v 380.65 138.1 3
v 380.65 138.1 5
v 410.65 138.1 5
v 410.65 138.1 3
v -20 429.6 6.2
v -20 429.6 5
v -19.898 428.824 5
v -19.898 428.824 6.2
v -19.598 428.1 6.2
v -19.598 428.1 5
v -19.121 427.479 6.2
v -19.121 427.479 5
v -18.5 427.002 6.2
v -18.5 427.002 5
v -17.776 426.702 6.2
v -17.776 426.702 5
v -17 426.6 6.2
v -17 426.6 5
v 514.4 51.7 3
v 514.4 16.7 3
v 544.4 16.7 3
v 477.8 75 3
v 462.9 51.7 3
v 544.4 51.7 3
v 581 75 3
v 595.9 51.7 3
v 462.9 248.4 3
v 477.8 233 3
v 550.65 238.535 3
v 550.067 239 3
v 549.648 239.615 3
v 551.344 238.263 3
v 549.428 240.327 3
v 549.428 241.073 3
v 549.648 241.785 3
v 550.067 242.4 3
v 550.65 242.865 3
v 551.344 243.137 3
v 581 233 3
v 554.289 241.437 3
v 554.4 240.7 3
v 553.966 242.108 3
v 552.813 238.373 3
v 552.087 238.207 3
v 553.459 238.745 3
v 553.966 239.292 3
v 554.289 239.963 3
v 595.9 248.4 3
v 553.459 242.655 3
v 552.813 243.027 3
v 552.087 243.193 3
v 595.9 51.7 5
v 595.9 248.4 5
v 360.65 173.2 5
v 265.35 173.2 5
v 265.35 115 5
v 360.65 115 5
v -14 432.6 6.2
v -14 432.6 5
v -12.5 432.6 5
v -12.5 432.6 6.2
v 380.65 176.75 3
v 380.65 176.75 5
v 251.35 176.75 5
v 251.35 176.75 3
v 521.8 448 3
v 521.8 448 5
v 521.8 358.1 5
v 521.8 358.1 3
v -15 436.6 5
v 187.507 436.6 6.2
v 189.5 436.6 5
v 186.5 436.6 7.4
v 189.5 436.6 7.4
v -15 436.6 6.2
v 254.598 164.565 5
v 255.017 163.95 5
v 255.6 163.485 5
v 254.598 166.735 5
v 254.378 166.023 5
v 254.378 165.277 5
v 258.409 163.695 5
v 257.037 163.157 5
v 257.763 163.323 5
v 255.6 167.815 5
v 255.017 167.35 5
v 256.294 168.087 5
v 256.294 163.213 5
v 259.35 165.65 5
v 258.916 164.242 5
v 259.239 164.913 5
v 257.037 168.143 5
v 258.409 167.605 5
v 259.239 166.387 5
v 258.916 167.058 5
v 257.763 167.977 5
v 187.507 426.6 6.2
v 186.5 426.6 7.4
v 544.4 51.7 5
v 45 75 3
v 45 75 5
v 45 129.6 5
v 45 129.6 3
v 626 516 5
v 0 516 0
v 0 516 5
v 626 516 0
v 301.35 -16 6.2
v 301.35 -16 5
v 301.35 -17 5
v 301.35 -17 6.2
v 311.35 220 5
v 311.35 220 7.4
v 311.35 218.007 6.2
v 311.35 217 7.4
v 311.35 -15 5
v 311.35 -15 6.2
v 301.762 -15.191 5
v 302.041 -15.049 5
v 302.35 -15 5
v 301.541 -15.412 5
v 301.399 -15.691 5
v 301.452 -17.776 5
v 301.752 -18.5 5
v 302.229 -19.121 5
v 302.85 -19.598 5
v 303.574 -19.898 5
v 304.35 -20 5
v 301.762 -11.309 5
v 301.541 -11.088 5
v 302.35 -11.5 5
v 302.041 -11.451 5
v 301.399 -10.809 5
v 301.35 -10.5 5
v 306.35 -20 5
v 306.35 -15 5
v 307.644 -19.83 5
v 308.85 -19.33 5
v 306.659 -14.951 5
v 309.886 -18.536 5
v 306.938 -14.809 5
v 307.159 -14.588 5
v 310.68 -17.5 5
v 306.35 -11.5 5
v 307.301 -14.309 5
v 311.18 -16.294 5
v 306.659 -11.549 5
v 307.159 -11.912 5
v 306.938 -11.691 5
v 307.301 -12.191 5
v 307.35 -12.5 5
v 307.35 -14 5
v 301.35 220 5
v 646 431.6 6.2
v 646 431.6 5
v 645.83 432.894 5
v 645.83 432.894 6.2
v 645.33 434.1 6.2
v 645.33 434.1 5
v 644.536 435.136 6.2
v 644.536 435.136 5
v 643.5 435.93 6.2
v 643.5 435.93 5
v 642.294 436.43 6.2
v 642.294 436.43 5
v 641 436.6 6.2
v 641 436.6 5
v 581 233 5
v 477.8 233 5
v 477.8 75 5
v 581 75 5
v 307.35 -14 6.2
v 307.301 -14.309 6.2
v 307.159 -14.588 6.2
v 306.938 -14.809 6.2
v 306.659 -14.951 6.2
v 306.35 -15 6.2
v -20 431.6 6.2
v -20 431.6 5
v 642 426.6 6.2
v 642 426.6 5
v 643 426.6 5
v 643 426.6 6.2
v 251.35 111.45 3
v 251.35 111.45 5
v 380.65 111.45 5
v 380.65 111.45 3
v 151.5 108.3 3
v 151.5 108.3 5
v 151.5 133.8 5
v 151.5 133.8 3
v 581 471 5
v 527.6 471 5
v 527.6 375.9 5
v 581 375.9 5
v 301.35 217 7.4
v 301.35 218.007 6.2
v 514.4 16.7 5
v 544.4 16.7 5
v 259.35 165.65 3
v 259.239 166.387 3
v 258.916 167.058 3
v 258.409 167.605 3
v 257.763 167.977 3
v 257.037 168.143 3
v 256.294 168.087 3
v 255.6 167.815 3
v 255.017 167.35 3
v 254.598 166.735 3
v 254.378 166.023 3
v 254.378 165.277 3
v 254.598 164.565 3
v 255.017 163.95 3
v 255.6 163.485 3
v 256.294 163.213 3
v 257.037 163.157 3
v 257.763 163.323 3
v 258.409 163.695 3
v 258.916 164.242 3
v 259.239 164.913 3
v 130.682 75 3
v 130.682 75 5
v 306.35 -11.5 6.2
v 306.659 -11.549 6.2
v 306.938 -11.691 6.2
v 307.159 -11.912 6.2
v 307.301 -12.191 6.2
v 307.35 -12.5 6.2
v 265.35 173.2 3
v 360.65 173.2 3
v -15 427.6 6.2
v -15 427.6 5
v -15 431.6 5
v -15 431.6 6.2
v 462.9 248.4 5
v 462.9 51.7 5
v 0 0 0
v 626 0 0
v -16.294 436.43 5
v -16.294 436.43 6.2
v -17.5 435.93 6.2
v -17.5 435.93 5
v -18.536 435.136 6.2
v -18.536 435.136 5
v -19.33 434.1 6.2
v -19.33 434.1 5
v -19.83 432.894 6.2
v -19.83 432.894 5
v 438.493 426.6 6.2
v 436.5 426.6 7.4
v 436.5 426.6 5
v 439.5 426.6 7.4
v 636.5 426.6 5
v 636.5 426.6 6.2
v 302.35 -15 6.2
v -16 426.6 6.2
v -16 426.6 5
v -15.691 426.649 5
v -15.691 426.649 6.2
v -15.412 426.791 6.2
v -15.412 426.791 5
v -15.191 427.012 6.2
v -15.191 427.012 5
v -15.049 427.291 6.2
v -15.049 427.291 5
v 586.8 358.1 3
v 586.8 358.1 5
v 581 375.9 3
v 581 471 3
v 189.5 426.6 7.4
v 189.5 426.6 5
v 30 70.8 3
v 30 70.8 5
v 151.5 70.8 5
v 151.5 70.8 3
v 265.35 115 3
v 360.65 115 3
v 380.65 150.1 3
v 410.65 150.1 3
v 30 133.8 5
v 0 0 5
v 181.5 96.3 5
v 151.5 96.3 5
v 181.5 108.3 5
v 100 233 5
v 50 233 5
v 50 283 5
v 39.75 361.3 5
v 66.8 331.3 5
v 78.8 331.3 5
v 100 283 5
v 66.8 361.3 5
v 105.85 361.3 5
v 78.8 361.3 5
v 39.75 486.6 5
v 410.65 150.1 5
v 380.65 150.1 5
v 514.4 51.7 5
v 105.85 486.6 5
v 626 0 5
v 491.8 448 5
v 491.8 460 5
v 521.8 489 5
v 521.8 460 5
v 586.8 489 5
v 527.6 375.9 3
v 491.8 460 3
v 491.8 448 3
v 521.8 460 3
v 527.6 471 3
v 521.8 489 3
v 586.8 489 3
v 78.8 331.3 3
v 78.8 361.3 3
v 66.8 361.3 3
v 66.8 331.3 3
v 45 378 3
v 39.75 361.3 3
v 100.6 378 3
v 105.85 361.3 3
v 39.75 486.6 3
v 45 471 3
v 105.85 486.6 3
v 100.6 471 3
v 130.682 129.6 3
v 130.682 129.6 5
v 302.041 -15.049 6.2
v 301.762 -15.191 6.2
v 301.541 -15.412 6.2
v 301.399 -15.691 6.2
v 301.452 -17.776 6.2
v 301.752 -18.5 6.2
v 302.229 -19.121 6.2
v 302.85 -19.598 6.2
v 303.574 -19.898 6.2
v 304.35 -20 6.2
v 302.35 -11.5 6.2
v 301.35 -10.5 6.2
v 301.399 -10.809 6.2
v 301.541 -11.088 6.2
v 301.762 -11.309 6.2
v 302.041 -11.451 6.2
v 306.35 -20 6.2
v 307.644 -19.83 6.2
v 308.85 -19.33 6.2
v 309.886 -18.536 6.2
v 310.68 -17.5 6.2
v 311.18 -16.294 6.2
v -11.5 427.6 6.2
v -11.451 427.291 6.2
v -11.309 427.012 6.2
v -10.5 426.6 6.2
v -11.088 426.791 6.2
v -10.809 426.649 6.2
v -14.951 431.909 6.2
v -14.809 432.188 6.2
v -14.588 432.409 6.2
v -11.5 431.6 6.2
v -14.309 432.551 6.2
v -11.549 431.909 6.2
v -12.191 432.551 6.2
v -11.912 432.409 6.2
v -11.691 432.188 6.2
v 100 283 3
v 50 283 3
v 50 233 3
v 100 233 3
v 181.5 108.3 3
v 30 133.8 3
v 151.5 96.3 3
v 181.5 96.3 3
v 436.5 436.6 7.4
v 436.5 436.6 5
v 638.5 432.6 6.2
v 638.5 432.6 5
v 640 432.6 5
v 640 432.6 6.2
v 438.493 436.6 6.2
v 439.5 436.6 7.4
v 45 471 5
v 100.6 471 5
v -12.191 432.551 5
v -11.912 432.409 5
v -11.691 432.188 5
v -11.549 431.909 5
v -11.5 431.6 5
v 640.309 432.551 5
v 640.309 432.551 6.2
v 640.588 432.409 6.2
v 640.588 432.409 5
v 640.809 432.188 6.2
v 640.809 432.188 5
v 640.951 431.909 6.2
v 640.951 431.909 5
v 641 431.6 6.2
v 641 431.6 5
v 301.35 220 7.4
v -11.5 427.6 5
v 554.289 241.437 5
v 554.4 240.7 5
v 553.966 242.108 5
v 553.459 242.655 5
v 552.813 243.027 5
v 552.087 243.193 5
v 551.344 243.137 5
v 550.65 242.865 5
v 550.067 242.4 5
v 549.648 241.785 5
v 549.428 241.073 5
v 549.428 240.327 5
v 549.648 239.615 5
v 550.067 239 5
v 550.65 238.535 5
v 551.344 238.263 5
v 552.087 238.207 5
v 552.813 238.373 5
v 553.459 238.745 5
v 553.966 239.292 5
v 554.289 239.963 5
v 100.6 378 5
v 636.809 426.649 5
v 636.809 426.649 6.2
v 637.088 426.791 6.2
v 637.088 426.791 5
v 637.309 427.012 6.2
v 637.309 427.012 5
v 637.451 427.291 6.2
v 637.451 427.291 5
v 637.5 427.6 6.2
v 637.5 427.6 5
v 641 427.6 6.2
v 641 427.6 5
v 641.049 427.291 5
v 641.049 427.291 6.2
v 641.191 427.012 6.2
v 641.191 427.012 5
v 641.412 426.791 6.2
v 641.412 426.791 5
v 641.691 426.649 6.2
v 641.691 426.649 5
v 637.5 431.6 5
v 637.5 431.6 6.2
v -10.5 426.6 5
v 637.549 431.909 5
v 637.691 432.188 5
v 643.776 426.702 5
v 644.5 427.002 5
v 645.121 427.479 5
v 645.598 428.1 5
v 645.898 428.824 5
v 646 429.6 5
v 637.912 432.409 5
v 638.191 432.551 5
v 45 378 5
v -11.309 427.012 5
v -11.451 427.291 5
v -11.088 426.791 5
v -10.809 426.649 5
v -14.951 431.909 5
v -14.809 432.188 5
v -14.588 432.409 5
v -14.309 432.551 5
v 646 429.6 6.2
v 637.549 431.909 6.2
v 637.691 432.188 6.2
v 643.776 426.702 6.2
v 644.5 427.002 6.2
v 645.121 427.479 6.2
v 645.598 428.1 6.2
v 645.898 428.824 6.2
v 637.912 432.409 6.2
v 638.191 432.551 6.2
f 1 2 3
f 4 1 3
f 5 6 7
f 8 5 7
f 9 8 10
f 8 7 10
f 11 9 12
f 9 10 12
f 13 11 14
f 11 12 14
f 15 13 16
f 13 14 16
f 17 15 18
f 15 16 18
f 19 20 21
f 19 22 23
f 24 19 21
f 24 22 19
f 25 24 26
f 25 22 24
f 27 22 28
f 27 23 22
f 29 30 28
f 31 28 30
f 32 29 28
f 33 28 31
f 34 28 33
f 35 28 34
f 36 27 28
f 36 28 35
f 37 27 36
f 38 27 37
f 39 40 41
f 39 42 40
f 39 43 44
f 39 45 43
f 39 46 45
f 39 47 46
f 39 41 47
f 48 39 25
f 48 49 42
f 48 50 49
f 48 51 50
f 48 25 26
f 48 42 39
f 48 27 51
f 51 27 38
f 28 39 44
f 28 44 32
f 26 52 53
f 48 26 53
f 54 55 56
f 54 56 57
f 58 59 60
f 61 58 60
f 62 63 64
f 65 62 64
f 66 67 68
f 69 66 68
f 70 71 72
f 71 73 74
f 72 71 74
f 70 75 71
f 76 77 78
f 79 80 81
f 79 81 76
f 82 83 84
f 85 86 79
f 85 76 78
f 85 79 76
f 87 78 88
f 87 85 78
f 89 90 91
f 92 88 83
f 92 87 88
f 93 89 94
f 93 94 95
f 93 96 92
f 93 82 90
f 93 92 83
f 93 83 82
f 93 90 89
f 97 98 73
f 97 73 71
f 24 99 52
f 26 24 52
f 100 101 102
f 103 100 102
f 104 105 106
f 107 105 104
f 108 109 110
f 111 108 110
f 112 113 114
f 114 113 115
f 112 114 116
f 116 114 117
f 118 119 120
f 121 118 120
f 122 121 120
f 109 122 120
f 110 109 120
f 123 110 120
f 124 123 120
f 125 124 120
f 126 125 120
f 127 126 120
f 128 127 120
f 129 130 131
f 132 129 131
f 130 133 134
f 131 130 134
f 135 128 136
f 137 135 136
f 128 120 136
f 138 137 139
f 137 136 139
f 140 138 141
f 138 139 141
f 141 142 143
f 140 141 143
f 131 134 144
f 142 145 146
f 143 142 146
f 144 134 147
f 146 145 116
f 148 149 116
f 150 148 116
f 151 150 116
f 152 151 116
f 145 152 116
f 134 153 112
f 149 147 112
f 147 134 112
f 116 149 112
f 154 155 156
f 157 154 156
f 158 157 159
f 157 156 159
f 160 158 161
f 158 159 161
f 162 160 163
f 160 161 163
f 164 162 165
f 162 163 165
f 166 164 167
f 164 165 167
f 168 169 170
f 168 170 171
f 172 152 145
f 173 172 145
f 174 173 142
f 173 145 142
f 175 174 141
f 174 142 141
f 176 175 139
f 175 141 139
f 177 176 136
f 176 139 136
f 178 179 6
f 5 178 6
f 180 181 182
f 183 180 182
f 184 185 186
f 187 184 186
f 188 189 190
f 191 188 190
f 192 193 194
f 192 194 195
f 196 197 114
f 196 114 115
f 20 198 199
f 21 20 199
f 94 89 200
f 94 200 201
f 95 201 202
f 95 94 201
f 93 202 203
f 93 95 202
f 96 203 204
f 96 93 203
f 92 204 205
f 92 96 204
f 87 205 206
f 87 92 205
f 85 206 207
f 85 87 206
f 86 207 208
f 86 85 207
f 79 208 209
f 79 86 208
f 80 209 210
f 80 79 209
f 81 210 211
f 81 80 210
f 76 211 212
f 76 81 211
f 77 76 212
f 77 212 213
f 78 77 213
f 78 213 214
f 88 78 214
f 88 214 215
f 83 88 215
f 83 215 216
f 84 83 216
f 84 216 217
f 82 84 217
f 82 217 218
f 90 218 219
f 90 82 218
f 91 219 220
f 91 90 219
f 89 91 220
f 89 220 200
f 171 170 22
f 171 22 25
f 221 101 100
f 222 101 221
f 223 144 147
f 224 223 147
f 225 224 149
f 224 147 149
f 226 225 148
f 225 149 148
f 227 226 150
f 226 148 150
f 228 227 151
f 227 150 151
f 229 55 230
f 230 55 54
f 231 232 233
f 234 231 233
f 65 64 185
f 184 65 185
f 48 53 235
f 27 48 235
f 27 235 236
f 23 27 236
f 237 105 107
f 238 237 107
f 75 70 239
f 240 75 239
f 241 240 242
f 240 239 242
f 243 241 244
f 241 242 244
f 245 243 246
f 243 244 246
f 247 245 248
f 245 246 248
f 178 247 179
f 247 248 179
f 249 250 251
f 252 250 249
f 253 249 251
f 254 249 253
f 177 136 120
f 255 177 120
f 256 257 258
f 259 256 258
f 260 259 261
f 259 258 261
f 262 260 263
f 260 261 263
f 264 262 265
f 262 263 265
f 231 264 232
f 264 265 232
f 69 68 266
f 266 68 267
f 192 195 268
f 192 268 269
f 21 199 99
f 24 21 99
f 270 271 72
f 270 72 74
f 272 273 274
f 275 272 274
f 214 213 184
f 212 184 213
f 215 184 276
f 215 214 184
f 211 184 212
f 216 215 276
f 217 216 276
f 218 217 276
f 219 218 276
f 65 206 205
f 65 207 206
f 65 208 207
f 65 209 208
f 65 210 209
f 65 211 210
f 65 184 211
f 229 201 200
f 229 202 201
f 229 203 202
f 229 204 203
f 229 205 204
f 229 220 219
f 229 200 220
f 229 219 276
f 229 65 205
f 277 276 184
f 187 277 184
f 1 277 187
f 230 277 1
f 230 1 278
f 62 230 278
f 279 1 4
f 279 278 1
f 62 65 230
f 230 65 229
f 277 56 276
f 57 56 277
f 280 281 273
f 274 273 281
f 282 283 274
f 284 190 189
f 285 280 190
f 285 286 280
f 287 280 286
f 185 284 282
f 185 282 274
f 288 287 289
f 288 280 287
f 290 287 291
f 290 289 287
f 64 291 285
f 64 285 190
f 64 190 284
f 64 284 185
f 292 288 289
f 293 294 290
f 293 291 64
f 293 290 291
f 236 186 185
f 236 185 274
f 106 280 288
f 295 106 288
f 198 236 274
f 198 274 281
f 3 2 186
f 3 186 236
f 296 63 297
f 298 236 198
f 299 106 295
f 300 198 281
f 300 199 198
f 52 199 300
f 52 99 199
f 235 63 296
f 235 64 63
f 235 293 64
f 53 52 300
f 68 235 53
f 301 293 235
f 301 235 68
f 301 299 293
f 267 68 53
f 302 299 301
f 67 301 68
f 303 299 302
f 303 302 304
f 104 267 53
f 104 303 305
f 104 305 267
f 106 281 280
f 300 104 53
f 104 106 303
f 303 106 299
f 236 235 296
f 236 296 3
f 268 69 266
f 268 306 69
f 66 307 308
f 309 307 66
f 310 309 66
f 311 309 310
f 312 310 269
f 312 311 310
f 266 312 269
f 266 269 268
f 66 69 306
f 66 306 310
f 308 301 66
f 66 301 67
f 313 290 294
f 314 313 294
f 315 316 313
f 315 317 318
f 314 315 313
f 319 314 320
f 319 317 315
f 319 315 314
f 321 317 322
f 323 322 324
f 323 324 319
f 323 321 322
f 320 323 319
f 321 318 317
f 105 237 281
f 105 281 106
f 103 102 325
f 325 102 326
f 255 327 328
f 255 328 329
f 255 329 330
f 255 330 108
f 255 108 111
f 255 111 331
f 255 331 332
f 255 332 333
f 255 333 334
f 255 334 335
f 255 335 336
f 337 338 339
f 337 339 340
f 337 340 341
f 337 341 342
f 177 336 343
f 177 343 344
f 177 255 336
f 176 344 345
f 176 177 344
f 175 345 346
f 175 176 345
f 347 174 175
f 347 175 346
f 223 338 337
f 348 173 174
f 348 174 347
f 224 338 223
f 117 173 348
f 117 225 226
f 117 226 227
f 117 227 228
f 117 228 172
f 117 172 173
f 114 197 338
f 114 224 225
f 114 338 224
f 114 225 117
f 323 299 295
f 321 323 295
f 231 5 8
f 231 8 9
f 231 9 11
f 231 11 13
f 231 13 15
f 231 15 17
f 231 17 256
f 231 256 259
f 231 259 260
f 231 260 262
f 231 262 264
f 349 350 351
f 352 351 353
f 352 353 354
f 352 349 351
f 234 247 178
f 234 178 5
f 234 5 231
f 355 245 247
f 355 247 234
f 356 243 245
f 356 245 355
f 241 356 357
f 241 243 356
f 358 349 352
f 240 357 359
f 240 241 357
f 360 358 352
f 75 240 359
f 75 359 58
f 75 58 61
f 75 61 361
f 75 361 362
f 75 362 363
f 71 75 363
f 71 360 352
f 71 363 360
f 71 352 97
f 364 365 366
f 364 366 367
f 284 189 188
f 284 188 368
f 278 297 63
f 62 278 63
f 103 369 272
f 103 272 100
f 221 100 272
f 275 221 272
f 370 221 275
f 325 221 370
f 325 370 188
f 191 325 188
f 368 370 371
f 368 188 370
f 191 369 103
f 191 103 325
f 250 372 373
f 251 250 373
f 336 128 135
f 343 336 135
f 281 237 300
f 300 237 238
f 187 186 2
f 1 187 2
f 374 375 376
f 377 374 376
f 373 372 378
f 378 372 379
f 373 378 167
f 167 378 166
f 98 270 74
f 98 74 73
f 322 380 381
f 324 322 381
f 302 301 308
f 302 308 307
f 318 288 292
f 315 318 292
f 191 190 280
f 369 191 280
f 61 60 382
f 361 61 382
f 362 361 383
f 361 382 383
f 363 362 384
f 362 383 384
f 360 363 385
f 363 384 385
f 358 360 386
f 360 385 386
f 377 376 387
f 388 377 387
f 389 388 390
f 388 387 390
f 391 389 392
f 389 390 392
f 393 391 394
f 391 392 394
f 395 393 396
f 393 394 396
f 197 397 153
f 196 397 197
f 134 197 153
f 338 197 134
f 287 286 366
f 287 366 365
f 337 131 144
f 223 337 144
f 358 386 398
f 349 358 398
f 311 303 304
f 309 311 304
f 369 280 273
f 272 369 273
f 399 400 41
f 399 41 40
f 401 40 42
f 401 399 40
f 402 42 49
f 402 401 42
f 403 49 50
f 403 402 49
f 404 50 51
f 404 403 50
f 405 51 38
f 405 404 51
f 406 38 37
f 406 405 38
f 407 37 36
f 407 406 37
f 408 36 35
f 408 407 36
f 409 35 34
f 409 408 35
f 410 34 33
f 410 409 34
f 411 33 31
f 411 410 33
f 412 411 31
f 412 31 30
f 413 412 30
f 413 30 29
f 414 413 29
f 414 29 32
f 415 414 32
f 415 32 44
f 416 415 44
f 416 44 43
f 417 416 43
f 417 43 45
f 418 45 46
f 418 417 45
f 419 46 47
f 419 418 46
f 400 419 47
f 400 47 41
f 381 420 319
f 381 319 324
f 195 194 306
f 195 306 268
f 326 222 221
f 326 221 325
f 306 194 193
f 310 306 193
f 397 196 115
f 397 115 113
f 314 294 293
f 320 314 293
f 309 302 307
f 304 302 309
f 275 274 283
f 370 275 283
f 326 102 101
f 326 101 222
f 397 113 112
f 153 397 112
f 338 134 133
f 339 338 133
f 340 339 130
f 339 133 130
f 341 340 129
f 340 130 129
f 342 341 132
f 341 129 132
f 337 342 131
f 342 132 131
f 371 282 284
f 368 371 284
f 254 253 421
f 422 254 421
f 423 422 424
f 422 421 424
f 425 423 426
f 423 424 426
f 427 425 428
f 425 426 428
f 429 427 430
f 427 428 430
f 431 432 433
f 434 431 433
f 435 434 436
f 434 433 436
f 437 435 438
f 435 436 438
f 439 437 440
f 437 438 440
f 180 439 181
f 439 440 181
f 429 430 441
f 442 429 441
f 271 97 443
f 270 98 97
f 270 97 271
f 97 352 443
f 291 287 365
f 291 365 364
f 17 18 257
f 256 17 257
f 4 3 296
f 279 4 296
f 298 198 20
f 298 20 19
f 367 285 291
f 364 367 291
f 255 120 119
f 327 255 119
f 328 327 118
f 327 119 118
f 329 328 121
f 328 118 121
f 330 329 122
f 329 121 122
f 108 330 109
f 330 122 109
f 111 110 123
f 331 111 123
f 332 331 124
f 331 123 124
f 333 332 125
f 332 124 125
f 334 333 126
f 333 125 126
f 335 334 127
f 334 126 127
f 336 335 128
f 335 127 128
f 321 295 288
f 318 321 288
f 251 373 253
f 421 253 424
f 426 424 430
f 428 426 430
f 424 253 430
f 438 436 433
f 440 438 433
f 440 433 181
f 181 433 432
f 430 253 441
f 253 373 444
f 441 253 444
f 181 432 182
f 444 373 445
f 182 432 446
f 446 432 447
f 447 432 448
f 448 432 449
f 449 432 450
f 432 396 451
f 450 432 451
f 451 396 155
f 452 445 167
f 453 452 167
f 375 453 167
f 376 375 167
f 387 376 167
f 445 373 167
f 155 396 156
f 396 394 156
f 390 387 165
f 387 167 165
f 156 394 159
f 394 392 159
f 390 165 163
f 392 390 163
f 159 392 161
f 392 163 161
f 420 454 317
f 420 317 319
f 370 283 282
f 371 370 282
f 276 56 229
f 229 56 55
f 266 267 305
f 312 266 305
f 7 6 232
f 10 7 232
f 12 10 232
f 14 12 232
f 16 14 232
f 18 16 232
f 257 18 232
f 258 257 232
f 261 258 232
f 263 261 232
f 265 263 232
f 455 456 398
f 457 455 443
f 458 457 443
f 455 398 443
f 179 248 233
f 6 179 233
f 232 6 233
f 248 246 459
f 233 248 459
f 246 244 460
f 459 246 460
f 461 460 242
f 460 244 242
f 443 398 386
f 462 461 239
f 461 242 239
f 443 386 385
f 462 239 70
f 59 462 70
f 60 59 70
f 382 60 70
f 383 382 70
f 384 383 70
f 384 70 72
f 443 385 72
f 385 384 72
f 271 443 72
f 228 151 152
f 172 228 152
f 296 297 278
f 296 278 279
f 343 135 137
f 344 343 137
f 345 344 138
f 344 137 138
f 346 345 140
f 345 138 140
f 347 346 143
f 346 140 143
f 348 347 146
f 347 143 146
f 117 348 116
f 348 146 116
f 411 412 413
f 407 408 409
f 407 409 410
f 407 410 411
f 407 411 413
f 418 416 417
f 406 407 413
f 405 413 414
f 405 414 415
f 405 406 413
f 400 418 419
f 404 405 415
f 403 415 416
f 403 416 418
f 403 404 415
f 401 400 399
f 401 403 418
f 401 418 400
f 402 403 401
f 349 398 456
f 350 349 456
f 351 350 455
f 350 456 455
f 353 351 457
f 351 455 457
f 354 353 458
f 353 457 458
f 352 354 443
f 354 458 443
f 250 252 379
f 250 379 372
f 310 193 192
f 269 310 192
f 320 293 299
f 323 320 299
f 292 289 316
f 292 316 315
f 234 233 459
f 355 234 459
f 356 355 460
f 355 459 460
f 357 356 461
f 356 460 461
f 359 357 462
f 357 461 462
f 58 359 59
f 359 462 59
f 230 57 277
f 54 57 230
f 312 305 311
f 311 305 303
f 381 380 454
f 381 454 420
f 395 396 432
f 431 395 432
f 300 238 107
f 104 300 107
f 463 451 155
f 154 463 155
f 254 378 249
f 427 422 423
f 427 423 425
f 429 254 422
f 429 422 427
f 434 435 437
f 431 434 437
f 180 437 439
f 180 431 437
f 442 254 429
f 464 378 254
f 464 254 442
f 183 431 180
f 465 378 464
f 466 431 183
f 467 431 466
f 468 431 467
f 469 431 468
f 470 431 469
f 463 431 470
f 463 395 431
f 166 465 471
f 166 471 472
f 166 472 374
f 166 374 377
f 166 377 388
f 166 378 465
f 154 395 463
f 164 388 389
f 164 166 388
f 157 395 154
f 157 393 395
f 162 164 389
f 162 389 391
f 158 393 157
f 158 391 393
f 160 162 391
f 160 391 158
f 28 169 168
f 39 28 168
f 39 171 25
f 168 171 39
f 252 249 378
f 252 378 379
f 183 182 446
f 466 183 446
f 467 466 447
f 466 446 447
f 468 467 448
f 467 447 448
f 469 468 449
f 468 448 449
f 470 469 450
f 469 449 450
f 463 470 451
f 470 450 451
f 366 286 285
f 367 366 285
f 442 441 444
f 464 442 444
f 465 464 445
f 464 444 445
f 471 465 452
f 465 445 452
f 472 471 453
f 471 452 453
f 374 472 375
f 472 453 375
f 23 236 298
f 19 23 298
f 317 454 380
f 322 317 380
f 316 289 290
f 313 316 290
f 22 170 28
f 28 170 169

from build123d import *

# Parameters (mm, degrees)
F0_W      = 626
F0_H      = 516
F1_DEPTH  = 5
F3_W      = 95.3
F3_H      = 58.2
F3_R      = 2.5
F3_W_2    = 30
F3_H_2    = 12
F4_W      = 55.6
F4_H      = 93
F4_W_2    = 12
F4_H_2    = 30
F5_W      = 103.2
F5_H      = 158
F5_R      = 2.5
F5_W_2    = 30
F5_H_2    = 35
F2_W      = 53.4
F2_H      = 95.1
F2_W_2    = 30
F2_H_2    = 12
F6_W      = 85.68197
F6_H      = 54.6
F6_W_2    = 30
F6_H_2    = 12
F7_W      = 50
F7_H      = 50
F8_DEPTH  = 2
F10_DEPTH = 1.2
F12_DEPTH = 10
F14_DEPTH = 1.2
F16_DEPTH = 10
F18_DEPTH = 10


with BuildPart() as f1:
    # F0 (on Top) → F1 (new body)
    with BuildSketch(Plane.XY):
        with Locations((313, 258)):
            Rectangle(F0_W, F0_H)
    extrude(amount=F1_DEPTH)

    # F3 (on face) + F4 (on face) + F5 (on face) + F2 (on face) + F6 (on face) + F7 (on face) → F8 (cut)
    with BuildSketch(Plane.XY.offset(5)):
        Polygon((251.35, 111.45), (380.65, 111.45), (380.65, 138.1), (380.65, 150.1), (380.65, 176.75), (251.35, 176.75), align=None)
        with Locations((313, 144.1)):
            Rectangle(F3_W, F3_H, mode=Mode.SUBTRACT)
        with Locations((256.85, 165.65)):
            Circle(F3_R, mode=Mode.SUBTRACT)
        with Locations((395.65, 144.1)):
            Rectangle(F3_W_2, F3_H_2)
    with BuildSketch(Plane.XY.offset(5)):
        Polygon((78.8, 361.3), (105.85, 361.3), (105.85, 486.6), (39.75, 486.6), (39.75, 361.3), (66.8, 361.3), align=None)
        with Locations((72.8, 424.5)):
            Rectangle(F4_W, F4_H, mode=Mode.SUBTRACT)
        with Locations((72.8, 346.3)):
            Rectangle(F4_W_2, F4_H_2)
    with BuildSketch(Plane.XY.offset(5)):
        Polygon((544.4, 51.7), (595.9, 51.7), (595.9, 248.4), (462.9, 248.4), (462.9, 51.7), (514.4, 51.7), align=None)
        with Locations((529.4, 154)):
            Rectangle(F5_W, F5_H, mode=Mode.SUBTRACT)
        with Locations((551.9, 240.7)):
            Circle(F5_R, mode=Mode.SUBTRACT)
        with Locations((529.4, 34.2)):
            Rectangle(F5_W_2, F5_H_2)
    with BuildSketch(Plane.XY.offset(5)):
        Polygon((521.8, 358.1), (586.8, 358.1), (586.8, 489), (521.8, 489), (521.8, 460), (521.8, 448), align=None)
        with Locations((554.3, 423.45)):
            Rectangle(F2_W, F2_H, mode=Mode.SUBTRACT)
        with Locations((506.8, 454)):
            Rectangle(F2_W_2, F2_H_2)
    with BuildSketch(Plane.XY.offset(5)):
        Polygon((151.5, 108.3), (151.5, 133.8), (30, 133.8), (30, 70.8), (151.5, 70.8), (151.5, 96.3), align=None)
        with Locations((87.840985, 102.3)):
            Rectangle(F6_W, F6_H, mode=Mode.SUBTRACT)
        with Locations((166.5, 102.3)):
            Rectangle(F6_W_2, F6_H_2)
    with BuildSketch(Plane.XY.offset(5)):
        with Locations((75, 258)):
            Rectangle(F7_W, F7_H)
    extrude(amount=-F8_DEPTH, mode=Mode.SUBTRACT)


with BuildPart() as f10:
    # F9 (on face) → F10 (new body)
    with BuildSketch(Plane.XY.offset(5)):
        with BuildLine():
            Line((189.5, 436.6), (-15, 436.6))
            ThreePointArc((-15, 436.6), (-18.535534, 435.135534), (-20, 431.6))
            Line((-20, 431.6), (-20, 429.6))
            ThreePointArc((-20, 429.6), (-19.12132, 427.47868), (-17, 426.6))
            Line((-17, 426.6), (-16, 426.6))
            ThreePointArc((-16, 426.6), (-15.292893, 426.892893), (-15, 427.6))
            Line((-15, 427.6), (-15, 431.6))
            ThreePointArc((-15, 431.6), (-14.707107, 432.307107), (-14, 432.6))
            Line((-14, 432.6), (-12.5, 432.6))
            ThreePointArc((-12.5, 432.6), (-11.792893, 432.307107), (-11.5, 431.6))
            Line((-11.5, 431.6), (-11.5, 427.6))
            ThreePointArc((-11.5, 427.6), (-11.207107, 426.892893), (-10.5, 426.6))
            Line((-10.5, 426.6), (189.5, 426.6))
            Line((189.5, 426.6), (189.5, 436.6))
        make_face()
        with BuildLine():
            Line((642, 426.6), (643, 426.6))
            ThreePointArc((643, 426.6), (645.12132, 427.47868), (646, 429.6))
            Line((646, 429.6), (646, 431.6))
            ThreePointArc((646, 431.6), (644.535534, 435.135534), (641, 436.6))
            Line((641, 436.6), (436.5, 436.6))
            Line((436.5, 436.6), (436.5, 426.6))
            Line((436.5, 426.6), (636.5, 426.6))
            ThreePointArc((636.5, 426.6), (637.207107, 426.892893), (637.5, 427.6))
            Line((637.5, 427.6), (637.5, 431.6))
            ThreePointArc((637.5, 431.6), (637.792893, 432.307107), (638.5, 432.6))
            Line((638.5, 432.6), (640, 432.6))
            ThreePointArc((640, 432.6), (640.707107, 432.307107), (641, 431.6))
            Line((641, 431.6), (641, 427.6))
            ThreePointArc((641, 427.6), (641.292893, 426.892893), (642, 426.6))
        make_face()
    extrude(amount=F10_DEPTH)

    # F11 (on face) → F12 (join, through all)
    with BuildSketch(Plane.XZ.offset(-426.6)):
        Polygon((187.50692, 6.2), (189.5, 6.2), (189.5, 7.4), (186.5, 7.4), align=None)
    extrude(amount=-F12_DEPTH)

    # F17 (on face) → F18 (join, through all)
    with BuildSketch(Plane.XZ.offset(-426.6)):
        Polygon((436.5, 7.4), (436.5, 6.2), (438.49308, 6.2), (439.5, 7.4), align=None)
    extrude(amount=-F18_DEPTH)


with BuildPart() as f14:
    # F13 (on face) → F14 (new body)
    with BuildSketch(Plane.XY.offset(5)):
        with BuildLine():
            Line((311.35, 220), (301.35, 220))
            Line((301.35, 220), (301.35, -10.5))
            ThreePointArc((301.35, -10.5), (301.642893, -11.207107), (302.35, -11.5))
            Line((302.35, -11.5), (306.35, -11.5))
            ThreePointArc((306.35, -11.5), (307.057107, -11.792893), (307.35, -12.5))
            Line((307.35, -12.5), (307.35, -14))
            ThreePointArc((307.35, -14), (307.057107, -14.707107), (306.35, -15))
            Line((306.35, -15), (302.35, -15))
            ThreePointArc((302.35, -15), (301.642893, -15.292893), (301.35, -16))
            Line((301.35, -16), (301.35, -17))
            ThreePointArc((301.35, -17), (302.22868, -19.12132), (304.35, -20))
            Line((304.35, -20), (306.35, -20))
            ThreePointArc((306.35, -20), (309.885534, -18.535534), (311.35, -15))
            Line((311.35, -15), (311.35, 220))
        make_face()
    extrude(amount=F14_DEPTH)

    # F15 (on face) → F16 (join, through all)
    with BuildSketch(Plane(origin=(301.35, 0, 0), x_dir=(0, -1, 0), z_dir=(-1, 0, 0))):
        Polygon((-220, 7.4), (-220, 6.2), (-218.00692, 6.2), (-217, 7.4), align=None)
    extrude(amount=-F16_DEPTH)


solid = Compound([f1.part, f10.part, f14.part])
